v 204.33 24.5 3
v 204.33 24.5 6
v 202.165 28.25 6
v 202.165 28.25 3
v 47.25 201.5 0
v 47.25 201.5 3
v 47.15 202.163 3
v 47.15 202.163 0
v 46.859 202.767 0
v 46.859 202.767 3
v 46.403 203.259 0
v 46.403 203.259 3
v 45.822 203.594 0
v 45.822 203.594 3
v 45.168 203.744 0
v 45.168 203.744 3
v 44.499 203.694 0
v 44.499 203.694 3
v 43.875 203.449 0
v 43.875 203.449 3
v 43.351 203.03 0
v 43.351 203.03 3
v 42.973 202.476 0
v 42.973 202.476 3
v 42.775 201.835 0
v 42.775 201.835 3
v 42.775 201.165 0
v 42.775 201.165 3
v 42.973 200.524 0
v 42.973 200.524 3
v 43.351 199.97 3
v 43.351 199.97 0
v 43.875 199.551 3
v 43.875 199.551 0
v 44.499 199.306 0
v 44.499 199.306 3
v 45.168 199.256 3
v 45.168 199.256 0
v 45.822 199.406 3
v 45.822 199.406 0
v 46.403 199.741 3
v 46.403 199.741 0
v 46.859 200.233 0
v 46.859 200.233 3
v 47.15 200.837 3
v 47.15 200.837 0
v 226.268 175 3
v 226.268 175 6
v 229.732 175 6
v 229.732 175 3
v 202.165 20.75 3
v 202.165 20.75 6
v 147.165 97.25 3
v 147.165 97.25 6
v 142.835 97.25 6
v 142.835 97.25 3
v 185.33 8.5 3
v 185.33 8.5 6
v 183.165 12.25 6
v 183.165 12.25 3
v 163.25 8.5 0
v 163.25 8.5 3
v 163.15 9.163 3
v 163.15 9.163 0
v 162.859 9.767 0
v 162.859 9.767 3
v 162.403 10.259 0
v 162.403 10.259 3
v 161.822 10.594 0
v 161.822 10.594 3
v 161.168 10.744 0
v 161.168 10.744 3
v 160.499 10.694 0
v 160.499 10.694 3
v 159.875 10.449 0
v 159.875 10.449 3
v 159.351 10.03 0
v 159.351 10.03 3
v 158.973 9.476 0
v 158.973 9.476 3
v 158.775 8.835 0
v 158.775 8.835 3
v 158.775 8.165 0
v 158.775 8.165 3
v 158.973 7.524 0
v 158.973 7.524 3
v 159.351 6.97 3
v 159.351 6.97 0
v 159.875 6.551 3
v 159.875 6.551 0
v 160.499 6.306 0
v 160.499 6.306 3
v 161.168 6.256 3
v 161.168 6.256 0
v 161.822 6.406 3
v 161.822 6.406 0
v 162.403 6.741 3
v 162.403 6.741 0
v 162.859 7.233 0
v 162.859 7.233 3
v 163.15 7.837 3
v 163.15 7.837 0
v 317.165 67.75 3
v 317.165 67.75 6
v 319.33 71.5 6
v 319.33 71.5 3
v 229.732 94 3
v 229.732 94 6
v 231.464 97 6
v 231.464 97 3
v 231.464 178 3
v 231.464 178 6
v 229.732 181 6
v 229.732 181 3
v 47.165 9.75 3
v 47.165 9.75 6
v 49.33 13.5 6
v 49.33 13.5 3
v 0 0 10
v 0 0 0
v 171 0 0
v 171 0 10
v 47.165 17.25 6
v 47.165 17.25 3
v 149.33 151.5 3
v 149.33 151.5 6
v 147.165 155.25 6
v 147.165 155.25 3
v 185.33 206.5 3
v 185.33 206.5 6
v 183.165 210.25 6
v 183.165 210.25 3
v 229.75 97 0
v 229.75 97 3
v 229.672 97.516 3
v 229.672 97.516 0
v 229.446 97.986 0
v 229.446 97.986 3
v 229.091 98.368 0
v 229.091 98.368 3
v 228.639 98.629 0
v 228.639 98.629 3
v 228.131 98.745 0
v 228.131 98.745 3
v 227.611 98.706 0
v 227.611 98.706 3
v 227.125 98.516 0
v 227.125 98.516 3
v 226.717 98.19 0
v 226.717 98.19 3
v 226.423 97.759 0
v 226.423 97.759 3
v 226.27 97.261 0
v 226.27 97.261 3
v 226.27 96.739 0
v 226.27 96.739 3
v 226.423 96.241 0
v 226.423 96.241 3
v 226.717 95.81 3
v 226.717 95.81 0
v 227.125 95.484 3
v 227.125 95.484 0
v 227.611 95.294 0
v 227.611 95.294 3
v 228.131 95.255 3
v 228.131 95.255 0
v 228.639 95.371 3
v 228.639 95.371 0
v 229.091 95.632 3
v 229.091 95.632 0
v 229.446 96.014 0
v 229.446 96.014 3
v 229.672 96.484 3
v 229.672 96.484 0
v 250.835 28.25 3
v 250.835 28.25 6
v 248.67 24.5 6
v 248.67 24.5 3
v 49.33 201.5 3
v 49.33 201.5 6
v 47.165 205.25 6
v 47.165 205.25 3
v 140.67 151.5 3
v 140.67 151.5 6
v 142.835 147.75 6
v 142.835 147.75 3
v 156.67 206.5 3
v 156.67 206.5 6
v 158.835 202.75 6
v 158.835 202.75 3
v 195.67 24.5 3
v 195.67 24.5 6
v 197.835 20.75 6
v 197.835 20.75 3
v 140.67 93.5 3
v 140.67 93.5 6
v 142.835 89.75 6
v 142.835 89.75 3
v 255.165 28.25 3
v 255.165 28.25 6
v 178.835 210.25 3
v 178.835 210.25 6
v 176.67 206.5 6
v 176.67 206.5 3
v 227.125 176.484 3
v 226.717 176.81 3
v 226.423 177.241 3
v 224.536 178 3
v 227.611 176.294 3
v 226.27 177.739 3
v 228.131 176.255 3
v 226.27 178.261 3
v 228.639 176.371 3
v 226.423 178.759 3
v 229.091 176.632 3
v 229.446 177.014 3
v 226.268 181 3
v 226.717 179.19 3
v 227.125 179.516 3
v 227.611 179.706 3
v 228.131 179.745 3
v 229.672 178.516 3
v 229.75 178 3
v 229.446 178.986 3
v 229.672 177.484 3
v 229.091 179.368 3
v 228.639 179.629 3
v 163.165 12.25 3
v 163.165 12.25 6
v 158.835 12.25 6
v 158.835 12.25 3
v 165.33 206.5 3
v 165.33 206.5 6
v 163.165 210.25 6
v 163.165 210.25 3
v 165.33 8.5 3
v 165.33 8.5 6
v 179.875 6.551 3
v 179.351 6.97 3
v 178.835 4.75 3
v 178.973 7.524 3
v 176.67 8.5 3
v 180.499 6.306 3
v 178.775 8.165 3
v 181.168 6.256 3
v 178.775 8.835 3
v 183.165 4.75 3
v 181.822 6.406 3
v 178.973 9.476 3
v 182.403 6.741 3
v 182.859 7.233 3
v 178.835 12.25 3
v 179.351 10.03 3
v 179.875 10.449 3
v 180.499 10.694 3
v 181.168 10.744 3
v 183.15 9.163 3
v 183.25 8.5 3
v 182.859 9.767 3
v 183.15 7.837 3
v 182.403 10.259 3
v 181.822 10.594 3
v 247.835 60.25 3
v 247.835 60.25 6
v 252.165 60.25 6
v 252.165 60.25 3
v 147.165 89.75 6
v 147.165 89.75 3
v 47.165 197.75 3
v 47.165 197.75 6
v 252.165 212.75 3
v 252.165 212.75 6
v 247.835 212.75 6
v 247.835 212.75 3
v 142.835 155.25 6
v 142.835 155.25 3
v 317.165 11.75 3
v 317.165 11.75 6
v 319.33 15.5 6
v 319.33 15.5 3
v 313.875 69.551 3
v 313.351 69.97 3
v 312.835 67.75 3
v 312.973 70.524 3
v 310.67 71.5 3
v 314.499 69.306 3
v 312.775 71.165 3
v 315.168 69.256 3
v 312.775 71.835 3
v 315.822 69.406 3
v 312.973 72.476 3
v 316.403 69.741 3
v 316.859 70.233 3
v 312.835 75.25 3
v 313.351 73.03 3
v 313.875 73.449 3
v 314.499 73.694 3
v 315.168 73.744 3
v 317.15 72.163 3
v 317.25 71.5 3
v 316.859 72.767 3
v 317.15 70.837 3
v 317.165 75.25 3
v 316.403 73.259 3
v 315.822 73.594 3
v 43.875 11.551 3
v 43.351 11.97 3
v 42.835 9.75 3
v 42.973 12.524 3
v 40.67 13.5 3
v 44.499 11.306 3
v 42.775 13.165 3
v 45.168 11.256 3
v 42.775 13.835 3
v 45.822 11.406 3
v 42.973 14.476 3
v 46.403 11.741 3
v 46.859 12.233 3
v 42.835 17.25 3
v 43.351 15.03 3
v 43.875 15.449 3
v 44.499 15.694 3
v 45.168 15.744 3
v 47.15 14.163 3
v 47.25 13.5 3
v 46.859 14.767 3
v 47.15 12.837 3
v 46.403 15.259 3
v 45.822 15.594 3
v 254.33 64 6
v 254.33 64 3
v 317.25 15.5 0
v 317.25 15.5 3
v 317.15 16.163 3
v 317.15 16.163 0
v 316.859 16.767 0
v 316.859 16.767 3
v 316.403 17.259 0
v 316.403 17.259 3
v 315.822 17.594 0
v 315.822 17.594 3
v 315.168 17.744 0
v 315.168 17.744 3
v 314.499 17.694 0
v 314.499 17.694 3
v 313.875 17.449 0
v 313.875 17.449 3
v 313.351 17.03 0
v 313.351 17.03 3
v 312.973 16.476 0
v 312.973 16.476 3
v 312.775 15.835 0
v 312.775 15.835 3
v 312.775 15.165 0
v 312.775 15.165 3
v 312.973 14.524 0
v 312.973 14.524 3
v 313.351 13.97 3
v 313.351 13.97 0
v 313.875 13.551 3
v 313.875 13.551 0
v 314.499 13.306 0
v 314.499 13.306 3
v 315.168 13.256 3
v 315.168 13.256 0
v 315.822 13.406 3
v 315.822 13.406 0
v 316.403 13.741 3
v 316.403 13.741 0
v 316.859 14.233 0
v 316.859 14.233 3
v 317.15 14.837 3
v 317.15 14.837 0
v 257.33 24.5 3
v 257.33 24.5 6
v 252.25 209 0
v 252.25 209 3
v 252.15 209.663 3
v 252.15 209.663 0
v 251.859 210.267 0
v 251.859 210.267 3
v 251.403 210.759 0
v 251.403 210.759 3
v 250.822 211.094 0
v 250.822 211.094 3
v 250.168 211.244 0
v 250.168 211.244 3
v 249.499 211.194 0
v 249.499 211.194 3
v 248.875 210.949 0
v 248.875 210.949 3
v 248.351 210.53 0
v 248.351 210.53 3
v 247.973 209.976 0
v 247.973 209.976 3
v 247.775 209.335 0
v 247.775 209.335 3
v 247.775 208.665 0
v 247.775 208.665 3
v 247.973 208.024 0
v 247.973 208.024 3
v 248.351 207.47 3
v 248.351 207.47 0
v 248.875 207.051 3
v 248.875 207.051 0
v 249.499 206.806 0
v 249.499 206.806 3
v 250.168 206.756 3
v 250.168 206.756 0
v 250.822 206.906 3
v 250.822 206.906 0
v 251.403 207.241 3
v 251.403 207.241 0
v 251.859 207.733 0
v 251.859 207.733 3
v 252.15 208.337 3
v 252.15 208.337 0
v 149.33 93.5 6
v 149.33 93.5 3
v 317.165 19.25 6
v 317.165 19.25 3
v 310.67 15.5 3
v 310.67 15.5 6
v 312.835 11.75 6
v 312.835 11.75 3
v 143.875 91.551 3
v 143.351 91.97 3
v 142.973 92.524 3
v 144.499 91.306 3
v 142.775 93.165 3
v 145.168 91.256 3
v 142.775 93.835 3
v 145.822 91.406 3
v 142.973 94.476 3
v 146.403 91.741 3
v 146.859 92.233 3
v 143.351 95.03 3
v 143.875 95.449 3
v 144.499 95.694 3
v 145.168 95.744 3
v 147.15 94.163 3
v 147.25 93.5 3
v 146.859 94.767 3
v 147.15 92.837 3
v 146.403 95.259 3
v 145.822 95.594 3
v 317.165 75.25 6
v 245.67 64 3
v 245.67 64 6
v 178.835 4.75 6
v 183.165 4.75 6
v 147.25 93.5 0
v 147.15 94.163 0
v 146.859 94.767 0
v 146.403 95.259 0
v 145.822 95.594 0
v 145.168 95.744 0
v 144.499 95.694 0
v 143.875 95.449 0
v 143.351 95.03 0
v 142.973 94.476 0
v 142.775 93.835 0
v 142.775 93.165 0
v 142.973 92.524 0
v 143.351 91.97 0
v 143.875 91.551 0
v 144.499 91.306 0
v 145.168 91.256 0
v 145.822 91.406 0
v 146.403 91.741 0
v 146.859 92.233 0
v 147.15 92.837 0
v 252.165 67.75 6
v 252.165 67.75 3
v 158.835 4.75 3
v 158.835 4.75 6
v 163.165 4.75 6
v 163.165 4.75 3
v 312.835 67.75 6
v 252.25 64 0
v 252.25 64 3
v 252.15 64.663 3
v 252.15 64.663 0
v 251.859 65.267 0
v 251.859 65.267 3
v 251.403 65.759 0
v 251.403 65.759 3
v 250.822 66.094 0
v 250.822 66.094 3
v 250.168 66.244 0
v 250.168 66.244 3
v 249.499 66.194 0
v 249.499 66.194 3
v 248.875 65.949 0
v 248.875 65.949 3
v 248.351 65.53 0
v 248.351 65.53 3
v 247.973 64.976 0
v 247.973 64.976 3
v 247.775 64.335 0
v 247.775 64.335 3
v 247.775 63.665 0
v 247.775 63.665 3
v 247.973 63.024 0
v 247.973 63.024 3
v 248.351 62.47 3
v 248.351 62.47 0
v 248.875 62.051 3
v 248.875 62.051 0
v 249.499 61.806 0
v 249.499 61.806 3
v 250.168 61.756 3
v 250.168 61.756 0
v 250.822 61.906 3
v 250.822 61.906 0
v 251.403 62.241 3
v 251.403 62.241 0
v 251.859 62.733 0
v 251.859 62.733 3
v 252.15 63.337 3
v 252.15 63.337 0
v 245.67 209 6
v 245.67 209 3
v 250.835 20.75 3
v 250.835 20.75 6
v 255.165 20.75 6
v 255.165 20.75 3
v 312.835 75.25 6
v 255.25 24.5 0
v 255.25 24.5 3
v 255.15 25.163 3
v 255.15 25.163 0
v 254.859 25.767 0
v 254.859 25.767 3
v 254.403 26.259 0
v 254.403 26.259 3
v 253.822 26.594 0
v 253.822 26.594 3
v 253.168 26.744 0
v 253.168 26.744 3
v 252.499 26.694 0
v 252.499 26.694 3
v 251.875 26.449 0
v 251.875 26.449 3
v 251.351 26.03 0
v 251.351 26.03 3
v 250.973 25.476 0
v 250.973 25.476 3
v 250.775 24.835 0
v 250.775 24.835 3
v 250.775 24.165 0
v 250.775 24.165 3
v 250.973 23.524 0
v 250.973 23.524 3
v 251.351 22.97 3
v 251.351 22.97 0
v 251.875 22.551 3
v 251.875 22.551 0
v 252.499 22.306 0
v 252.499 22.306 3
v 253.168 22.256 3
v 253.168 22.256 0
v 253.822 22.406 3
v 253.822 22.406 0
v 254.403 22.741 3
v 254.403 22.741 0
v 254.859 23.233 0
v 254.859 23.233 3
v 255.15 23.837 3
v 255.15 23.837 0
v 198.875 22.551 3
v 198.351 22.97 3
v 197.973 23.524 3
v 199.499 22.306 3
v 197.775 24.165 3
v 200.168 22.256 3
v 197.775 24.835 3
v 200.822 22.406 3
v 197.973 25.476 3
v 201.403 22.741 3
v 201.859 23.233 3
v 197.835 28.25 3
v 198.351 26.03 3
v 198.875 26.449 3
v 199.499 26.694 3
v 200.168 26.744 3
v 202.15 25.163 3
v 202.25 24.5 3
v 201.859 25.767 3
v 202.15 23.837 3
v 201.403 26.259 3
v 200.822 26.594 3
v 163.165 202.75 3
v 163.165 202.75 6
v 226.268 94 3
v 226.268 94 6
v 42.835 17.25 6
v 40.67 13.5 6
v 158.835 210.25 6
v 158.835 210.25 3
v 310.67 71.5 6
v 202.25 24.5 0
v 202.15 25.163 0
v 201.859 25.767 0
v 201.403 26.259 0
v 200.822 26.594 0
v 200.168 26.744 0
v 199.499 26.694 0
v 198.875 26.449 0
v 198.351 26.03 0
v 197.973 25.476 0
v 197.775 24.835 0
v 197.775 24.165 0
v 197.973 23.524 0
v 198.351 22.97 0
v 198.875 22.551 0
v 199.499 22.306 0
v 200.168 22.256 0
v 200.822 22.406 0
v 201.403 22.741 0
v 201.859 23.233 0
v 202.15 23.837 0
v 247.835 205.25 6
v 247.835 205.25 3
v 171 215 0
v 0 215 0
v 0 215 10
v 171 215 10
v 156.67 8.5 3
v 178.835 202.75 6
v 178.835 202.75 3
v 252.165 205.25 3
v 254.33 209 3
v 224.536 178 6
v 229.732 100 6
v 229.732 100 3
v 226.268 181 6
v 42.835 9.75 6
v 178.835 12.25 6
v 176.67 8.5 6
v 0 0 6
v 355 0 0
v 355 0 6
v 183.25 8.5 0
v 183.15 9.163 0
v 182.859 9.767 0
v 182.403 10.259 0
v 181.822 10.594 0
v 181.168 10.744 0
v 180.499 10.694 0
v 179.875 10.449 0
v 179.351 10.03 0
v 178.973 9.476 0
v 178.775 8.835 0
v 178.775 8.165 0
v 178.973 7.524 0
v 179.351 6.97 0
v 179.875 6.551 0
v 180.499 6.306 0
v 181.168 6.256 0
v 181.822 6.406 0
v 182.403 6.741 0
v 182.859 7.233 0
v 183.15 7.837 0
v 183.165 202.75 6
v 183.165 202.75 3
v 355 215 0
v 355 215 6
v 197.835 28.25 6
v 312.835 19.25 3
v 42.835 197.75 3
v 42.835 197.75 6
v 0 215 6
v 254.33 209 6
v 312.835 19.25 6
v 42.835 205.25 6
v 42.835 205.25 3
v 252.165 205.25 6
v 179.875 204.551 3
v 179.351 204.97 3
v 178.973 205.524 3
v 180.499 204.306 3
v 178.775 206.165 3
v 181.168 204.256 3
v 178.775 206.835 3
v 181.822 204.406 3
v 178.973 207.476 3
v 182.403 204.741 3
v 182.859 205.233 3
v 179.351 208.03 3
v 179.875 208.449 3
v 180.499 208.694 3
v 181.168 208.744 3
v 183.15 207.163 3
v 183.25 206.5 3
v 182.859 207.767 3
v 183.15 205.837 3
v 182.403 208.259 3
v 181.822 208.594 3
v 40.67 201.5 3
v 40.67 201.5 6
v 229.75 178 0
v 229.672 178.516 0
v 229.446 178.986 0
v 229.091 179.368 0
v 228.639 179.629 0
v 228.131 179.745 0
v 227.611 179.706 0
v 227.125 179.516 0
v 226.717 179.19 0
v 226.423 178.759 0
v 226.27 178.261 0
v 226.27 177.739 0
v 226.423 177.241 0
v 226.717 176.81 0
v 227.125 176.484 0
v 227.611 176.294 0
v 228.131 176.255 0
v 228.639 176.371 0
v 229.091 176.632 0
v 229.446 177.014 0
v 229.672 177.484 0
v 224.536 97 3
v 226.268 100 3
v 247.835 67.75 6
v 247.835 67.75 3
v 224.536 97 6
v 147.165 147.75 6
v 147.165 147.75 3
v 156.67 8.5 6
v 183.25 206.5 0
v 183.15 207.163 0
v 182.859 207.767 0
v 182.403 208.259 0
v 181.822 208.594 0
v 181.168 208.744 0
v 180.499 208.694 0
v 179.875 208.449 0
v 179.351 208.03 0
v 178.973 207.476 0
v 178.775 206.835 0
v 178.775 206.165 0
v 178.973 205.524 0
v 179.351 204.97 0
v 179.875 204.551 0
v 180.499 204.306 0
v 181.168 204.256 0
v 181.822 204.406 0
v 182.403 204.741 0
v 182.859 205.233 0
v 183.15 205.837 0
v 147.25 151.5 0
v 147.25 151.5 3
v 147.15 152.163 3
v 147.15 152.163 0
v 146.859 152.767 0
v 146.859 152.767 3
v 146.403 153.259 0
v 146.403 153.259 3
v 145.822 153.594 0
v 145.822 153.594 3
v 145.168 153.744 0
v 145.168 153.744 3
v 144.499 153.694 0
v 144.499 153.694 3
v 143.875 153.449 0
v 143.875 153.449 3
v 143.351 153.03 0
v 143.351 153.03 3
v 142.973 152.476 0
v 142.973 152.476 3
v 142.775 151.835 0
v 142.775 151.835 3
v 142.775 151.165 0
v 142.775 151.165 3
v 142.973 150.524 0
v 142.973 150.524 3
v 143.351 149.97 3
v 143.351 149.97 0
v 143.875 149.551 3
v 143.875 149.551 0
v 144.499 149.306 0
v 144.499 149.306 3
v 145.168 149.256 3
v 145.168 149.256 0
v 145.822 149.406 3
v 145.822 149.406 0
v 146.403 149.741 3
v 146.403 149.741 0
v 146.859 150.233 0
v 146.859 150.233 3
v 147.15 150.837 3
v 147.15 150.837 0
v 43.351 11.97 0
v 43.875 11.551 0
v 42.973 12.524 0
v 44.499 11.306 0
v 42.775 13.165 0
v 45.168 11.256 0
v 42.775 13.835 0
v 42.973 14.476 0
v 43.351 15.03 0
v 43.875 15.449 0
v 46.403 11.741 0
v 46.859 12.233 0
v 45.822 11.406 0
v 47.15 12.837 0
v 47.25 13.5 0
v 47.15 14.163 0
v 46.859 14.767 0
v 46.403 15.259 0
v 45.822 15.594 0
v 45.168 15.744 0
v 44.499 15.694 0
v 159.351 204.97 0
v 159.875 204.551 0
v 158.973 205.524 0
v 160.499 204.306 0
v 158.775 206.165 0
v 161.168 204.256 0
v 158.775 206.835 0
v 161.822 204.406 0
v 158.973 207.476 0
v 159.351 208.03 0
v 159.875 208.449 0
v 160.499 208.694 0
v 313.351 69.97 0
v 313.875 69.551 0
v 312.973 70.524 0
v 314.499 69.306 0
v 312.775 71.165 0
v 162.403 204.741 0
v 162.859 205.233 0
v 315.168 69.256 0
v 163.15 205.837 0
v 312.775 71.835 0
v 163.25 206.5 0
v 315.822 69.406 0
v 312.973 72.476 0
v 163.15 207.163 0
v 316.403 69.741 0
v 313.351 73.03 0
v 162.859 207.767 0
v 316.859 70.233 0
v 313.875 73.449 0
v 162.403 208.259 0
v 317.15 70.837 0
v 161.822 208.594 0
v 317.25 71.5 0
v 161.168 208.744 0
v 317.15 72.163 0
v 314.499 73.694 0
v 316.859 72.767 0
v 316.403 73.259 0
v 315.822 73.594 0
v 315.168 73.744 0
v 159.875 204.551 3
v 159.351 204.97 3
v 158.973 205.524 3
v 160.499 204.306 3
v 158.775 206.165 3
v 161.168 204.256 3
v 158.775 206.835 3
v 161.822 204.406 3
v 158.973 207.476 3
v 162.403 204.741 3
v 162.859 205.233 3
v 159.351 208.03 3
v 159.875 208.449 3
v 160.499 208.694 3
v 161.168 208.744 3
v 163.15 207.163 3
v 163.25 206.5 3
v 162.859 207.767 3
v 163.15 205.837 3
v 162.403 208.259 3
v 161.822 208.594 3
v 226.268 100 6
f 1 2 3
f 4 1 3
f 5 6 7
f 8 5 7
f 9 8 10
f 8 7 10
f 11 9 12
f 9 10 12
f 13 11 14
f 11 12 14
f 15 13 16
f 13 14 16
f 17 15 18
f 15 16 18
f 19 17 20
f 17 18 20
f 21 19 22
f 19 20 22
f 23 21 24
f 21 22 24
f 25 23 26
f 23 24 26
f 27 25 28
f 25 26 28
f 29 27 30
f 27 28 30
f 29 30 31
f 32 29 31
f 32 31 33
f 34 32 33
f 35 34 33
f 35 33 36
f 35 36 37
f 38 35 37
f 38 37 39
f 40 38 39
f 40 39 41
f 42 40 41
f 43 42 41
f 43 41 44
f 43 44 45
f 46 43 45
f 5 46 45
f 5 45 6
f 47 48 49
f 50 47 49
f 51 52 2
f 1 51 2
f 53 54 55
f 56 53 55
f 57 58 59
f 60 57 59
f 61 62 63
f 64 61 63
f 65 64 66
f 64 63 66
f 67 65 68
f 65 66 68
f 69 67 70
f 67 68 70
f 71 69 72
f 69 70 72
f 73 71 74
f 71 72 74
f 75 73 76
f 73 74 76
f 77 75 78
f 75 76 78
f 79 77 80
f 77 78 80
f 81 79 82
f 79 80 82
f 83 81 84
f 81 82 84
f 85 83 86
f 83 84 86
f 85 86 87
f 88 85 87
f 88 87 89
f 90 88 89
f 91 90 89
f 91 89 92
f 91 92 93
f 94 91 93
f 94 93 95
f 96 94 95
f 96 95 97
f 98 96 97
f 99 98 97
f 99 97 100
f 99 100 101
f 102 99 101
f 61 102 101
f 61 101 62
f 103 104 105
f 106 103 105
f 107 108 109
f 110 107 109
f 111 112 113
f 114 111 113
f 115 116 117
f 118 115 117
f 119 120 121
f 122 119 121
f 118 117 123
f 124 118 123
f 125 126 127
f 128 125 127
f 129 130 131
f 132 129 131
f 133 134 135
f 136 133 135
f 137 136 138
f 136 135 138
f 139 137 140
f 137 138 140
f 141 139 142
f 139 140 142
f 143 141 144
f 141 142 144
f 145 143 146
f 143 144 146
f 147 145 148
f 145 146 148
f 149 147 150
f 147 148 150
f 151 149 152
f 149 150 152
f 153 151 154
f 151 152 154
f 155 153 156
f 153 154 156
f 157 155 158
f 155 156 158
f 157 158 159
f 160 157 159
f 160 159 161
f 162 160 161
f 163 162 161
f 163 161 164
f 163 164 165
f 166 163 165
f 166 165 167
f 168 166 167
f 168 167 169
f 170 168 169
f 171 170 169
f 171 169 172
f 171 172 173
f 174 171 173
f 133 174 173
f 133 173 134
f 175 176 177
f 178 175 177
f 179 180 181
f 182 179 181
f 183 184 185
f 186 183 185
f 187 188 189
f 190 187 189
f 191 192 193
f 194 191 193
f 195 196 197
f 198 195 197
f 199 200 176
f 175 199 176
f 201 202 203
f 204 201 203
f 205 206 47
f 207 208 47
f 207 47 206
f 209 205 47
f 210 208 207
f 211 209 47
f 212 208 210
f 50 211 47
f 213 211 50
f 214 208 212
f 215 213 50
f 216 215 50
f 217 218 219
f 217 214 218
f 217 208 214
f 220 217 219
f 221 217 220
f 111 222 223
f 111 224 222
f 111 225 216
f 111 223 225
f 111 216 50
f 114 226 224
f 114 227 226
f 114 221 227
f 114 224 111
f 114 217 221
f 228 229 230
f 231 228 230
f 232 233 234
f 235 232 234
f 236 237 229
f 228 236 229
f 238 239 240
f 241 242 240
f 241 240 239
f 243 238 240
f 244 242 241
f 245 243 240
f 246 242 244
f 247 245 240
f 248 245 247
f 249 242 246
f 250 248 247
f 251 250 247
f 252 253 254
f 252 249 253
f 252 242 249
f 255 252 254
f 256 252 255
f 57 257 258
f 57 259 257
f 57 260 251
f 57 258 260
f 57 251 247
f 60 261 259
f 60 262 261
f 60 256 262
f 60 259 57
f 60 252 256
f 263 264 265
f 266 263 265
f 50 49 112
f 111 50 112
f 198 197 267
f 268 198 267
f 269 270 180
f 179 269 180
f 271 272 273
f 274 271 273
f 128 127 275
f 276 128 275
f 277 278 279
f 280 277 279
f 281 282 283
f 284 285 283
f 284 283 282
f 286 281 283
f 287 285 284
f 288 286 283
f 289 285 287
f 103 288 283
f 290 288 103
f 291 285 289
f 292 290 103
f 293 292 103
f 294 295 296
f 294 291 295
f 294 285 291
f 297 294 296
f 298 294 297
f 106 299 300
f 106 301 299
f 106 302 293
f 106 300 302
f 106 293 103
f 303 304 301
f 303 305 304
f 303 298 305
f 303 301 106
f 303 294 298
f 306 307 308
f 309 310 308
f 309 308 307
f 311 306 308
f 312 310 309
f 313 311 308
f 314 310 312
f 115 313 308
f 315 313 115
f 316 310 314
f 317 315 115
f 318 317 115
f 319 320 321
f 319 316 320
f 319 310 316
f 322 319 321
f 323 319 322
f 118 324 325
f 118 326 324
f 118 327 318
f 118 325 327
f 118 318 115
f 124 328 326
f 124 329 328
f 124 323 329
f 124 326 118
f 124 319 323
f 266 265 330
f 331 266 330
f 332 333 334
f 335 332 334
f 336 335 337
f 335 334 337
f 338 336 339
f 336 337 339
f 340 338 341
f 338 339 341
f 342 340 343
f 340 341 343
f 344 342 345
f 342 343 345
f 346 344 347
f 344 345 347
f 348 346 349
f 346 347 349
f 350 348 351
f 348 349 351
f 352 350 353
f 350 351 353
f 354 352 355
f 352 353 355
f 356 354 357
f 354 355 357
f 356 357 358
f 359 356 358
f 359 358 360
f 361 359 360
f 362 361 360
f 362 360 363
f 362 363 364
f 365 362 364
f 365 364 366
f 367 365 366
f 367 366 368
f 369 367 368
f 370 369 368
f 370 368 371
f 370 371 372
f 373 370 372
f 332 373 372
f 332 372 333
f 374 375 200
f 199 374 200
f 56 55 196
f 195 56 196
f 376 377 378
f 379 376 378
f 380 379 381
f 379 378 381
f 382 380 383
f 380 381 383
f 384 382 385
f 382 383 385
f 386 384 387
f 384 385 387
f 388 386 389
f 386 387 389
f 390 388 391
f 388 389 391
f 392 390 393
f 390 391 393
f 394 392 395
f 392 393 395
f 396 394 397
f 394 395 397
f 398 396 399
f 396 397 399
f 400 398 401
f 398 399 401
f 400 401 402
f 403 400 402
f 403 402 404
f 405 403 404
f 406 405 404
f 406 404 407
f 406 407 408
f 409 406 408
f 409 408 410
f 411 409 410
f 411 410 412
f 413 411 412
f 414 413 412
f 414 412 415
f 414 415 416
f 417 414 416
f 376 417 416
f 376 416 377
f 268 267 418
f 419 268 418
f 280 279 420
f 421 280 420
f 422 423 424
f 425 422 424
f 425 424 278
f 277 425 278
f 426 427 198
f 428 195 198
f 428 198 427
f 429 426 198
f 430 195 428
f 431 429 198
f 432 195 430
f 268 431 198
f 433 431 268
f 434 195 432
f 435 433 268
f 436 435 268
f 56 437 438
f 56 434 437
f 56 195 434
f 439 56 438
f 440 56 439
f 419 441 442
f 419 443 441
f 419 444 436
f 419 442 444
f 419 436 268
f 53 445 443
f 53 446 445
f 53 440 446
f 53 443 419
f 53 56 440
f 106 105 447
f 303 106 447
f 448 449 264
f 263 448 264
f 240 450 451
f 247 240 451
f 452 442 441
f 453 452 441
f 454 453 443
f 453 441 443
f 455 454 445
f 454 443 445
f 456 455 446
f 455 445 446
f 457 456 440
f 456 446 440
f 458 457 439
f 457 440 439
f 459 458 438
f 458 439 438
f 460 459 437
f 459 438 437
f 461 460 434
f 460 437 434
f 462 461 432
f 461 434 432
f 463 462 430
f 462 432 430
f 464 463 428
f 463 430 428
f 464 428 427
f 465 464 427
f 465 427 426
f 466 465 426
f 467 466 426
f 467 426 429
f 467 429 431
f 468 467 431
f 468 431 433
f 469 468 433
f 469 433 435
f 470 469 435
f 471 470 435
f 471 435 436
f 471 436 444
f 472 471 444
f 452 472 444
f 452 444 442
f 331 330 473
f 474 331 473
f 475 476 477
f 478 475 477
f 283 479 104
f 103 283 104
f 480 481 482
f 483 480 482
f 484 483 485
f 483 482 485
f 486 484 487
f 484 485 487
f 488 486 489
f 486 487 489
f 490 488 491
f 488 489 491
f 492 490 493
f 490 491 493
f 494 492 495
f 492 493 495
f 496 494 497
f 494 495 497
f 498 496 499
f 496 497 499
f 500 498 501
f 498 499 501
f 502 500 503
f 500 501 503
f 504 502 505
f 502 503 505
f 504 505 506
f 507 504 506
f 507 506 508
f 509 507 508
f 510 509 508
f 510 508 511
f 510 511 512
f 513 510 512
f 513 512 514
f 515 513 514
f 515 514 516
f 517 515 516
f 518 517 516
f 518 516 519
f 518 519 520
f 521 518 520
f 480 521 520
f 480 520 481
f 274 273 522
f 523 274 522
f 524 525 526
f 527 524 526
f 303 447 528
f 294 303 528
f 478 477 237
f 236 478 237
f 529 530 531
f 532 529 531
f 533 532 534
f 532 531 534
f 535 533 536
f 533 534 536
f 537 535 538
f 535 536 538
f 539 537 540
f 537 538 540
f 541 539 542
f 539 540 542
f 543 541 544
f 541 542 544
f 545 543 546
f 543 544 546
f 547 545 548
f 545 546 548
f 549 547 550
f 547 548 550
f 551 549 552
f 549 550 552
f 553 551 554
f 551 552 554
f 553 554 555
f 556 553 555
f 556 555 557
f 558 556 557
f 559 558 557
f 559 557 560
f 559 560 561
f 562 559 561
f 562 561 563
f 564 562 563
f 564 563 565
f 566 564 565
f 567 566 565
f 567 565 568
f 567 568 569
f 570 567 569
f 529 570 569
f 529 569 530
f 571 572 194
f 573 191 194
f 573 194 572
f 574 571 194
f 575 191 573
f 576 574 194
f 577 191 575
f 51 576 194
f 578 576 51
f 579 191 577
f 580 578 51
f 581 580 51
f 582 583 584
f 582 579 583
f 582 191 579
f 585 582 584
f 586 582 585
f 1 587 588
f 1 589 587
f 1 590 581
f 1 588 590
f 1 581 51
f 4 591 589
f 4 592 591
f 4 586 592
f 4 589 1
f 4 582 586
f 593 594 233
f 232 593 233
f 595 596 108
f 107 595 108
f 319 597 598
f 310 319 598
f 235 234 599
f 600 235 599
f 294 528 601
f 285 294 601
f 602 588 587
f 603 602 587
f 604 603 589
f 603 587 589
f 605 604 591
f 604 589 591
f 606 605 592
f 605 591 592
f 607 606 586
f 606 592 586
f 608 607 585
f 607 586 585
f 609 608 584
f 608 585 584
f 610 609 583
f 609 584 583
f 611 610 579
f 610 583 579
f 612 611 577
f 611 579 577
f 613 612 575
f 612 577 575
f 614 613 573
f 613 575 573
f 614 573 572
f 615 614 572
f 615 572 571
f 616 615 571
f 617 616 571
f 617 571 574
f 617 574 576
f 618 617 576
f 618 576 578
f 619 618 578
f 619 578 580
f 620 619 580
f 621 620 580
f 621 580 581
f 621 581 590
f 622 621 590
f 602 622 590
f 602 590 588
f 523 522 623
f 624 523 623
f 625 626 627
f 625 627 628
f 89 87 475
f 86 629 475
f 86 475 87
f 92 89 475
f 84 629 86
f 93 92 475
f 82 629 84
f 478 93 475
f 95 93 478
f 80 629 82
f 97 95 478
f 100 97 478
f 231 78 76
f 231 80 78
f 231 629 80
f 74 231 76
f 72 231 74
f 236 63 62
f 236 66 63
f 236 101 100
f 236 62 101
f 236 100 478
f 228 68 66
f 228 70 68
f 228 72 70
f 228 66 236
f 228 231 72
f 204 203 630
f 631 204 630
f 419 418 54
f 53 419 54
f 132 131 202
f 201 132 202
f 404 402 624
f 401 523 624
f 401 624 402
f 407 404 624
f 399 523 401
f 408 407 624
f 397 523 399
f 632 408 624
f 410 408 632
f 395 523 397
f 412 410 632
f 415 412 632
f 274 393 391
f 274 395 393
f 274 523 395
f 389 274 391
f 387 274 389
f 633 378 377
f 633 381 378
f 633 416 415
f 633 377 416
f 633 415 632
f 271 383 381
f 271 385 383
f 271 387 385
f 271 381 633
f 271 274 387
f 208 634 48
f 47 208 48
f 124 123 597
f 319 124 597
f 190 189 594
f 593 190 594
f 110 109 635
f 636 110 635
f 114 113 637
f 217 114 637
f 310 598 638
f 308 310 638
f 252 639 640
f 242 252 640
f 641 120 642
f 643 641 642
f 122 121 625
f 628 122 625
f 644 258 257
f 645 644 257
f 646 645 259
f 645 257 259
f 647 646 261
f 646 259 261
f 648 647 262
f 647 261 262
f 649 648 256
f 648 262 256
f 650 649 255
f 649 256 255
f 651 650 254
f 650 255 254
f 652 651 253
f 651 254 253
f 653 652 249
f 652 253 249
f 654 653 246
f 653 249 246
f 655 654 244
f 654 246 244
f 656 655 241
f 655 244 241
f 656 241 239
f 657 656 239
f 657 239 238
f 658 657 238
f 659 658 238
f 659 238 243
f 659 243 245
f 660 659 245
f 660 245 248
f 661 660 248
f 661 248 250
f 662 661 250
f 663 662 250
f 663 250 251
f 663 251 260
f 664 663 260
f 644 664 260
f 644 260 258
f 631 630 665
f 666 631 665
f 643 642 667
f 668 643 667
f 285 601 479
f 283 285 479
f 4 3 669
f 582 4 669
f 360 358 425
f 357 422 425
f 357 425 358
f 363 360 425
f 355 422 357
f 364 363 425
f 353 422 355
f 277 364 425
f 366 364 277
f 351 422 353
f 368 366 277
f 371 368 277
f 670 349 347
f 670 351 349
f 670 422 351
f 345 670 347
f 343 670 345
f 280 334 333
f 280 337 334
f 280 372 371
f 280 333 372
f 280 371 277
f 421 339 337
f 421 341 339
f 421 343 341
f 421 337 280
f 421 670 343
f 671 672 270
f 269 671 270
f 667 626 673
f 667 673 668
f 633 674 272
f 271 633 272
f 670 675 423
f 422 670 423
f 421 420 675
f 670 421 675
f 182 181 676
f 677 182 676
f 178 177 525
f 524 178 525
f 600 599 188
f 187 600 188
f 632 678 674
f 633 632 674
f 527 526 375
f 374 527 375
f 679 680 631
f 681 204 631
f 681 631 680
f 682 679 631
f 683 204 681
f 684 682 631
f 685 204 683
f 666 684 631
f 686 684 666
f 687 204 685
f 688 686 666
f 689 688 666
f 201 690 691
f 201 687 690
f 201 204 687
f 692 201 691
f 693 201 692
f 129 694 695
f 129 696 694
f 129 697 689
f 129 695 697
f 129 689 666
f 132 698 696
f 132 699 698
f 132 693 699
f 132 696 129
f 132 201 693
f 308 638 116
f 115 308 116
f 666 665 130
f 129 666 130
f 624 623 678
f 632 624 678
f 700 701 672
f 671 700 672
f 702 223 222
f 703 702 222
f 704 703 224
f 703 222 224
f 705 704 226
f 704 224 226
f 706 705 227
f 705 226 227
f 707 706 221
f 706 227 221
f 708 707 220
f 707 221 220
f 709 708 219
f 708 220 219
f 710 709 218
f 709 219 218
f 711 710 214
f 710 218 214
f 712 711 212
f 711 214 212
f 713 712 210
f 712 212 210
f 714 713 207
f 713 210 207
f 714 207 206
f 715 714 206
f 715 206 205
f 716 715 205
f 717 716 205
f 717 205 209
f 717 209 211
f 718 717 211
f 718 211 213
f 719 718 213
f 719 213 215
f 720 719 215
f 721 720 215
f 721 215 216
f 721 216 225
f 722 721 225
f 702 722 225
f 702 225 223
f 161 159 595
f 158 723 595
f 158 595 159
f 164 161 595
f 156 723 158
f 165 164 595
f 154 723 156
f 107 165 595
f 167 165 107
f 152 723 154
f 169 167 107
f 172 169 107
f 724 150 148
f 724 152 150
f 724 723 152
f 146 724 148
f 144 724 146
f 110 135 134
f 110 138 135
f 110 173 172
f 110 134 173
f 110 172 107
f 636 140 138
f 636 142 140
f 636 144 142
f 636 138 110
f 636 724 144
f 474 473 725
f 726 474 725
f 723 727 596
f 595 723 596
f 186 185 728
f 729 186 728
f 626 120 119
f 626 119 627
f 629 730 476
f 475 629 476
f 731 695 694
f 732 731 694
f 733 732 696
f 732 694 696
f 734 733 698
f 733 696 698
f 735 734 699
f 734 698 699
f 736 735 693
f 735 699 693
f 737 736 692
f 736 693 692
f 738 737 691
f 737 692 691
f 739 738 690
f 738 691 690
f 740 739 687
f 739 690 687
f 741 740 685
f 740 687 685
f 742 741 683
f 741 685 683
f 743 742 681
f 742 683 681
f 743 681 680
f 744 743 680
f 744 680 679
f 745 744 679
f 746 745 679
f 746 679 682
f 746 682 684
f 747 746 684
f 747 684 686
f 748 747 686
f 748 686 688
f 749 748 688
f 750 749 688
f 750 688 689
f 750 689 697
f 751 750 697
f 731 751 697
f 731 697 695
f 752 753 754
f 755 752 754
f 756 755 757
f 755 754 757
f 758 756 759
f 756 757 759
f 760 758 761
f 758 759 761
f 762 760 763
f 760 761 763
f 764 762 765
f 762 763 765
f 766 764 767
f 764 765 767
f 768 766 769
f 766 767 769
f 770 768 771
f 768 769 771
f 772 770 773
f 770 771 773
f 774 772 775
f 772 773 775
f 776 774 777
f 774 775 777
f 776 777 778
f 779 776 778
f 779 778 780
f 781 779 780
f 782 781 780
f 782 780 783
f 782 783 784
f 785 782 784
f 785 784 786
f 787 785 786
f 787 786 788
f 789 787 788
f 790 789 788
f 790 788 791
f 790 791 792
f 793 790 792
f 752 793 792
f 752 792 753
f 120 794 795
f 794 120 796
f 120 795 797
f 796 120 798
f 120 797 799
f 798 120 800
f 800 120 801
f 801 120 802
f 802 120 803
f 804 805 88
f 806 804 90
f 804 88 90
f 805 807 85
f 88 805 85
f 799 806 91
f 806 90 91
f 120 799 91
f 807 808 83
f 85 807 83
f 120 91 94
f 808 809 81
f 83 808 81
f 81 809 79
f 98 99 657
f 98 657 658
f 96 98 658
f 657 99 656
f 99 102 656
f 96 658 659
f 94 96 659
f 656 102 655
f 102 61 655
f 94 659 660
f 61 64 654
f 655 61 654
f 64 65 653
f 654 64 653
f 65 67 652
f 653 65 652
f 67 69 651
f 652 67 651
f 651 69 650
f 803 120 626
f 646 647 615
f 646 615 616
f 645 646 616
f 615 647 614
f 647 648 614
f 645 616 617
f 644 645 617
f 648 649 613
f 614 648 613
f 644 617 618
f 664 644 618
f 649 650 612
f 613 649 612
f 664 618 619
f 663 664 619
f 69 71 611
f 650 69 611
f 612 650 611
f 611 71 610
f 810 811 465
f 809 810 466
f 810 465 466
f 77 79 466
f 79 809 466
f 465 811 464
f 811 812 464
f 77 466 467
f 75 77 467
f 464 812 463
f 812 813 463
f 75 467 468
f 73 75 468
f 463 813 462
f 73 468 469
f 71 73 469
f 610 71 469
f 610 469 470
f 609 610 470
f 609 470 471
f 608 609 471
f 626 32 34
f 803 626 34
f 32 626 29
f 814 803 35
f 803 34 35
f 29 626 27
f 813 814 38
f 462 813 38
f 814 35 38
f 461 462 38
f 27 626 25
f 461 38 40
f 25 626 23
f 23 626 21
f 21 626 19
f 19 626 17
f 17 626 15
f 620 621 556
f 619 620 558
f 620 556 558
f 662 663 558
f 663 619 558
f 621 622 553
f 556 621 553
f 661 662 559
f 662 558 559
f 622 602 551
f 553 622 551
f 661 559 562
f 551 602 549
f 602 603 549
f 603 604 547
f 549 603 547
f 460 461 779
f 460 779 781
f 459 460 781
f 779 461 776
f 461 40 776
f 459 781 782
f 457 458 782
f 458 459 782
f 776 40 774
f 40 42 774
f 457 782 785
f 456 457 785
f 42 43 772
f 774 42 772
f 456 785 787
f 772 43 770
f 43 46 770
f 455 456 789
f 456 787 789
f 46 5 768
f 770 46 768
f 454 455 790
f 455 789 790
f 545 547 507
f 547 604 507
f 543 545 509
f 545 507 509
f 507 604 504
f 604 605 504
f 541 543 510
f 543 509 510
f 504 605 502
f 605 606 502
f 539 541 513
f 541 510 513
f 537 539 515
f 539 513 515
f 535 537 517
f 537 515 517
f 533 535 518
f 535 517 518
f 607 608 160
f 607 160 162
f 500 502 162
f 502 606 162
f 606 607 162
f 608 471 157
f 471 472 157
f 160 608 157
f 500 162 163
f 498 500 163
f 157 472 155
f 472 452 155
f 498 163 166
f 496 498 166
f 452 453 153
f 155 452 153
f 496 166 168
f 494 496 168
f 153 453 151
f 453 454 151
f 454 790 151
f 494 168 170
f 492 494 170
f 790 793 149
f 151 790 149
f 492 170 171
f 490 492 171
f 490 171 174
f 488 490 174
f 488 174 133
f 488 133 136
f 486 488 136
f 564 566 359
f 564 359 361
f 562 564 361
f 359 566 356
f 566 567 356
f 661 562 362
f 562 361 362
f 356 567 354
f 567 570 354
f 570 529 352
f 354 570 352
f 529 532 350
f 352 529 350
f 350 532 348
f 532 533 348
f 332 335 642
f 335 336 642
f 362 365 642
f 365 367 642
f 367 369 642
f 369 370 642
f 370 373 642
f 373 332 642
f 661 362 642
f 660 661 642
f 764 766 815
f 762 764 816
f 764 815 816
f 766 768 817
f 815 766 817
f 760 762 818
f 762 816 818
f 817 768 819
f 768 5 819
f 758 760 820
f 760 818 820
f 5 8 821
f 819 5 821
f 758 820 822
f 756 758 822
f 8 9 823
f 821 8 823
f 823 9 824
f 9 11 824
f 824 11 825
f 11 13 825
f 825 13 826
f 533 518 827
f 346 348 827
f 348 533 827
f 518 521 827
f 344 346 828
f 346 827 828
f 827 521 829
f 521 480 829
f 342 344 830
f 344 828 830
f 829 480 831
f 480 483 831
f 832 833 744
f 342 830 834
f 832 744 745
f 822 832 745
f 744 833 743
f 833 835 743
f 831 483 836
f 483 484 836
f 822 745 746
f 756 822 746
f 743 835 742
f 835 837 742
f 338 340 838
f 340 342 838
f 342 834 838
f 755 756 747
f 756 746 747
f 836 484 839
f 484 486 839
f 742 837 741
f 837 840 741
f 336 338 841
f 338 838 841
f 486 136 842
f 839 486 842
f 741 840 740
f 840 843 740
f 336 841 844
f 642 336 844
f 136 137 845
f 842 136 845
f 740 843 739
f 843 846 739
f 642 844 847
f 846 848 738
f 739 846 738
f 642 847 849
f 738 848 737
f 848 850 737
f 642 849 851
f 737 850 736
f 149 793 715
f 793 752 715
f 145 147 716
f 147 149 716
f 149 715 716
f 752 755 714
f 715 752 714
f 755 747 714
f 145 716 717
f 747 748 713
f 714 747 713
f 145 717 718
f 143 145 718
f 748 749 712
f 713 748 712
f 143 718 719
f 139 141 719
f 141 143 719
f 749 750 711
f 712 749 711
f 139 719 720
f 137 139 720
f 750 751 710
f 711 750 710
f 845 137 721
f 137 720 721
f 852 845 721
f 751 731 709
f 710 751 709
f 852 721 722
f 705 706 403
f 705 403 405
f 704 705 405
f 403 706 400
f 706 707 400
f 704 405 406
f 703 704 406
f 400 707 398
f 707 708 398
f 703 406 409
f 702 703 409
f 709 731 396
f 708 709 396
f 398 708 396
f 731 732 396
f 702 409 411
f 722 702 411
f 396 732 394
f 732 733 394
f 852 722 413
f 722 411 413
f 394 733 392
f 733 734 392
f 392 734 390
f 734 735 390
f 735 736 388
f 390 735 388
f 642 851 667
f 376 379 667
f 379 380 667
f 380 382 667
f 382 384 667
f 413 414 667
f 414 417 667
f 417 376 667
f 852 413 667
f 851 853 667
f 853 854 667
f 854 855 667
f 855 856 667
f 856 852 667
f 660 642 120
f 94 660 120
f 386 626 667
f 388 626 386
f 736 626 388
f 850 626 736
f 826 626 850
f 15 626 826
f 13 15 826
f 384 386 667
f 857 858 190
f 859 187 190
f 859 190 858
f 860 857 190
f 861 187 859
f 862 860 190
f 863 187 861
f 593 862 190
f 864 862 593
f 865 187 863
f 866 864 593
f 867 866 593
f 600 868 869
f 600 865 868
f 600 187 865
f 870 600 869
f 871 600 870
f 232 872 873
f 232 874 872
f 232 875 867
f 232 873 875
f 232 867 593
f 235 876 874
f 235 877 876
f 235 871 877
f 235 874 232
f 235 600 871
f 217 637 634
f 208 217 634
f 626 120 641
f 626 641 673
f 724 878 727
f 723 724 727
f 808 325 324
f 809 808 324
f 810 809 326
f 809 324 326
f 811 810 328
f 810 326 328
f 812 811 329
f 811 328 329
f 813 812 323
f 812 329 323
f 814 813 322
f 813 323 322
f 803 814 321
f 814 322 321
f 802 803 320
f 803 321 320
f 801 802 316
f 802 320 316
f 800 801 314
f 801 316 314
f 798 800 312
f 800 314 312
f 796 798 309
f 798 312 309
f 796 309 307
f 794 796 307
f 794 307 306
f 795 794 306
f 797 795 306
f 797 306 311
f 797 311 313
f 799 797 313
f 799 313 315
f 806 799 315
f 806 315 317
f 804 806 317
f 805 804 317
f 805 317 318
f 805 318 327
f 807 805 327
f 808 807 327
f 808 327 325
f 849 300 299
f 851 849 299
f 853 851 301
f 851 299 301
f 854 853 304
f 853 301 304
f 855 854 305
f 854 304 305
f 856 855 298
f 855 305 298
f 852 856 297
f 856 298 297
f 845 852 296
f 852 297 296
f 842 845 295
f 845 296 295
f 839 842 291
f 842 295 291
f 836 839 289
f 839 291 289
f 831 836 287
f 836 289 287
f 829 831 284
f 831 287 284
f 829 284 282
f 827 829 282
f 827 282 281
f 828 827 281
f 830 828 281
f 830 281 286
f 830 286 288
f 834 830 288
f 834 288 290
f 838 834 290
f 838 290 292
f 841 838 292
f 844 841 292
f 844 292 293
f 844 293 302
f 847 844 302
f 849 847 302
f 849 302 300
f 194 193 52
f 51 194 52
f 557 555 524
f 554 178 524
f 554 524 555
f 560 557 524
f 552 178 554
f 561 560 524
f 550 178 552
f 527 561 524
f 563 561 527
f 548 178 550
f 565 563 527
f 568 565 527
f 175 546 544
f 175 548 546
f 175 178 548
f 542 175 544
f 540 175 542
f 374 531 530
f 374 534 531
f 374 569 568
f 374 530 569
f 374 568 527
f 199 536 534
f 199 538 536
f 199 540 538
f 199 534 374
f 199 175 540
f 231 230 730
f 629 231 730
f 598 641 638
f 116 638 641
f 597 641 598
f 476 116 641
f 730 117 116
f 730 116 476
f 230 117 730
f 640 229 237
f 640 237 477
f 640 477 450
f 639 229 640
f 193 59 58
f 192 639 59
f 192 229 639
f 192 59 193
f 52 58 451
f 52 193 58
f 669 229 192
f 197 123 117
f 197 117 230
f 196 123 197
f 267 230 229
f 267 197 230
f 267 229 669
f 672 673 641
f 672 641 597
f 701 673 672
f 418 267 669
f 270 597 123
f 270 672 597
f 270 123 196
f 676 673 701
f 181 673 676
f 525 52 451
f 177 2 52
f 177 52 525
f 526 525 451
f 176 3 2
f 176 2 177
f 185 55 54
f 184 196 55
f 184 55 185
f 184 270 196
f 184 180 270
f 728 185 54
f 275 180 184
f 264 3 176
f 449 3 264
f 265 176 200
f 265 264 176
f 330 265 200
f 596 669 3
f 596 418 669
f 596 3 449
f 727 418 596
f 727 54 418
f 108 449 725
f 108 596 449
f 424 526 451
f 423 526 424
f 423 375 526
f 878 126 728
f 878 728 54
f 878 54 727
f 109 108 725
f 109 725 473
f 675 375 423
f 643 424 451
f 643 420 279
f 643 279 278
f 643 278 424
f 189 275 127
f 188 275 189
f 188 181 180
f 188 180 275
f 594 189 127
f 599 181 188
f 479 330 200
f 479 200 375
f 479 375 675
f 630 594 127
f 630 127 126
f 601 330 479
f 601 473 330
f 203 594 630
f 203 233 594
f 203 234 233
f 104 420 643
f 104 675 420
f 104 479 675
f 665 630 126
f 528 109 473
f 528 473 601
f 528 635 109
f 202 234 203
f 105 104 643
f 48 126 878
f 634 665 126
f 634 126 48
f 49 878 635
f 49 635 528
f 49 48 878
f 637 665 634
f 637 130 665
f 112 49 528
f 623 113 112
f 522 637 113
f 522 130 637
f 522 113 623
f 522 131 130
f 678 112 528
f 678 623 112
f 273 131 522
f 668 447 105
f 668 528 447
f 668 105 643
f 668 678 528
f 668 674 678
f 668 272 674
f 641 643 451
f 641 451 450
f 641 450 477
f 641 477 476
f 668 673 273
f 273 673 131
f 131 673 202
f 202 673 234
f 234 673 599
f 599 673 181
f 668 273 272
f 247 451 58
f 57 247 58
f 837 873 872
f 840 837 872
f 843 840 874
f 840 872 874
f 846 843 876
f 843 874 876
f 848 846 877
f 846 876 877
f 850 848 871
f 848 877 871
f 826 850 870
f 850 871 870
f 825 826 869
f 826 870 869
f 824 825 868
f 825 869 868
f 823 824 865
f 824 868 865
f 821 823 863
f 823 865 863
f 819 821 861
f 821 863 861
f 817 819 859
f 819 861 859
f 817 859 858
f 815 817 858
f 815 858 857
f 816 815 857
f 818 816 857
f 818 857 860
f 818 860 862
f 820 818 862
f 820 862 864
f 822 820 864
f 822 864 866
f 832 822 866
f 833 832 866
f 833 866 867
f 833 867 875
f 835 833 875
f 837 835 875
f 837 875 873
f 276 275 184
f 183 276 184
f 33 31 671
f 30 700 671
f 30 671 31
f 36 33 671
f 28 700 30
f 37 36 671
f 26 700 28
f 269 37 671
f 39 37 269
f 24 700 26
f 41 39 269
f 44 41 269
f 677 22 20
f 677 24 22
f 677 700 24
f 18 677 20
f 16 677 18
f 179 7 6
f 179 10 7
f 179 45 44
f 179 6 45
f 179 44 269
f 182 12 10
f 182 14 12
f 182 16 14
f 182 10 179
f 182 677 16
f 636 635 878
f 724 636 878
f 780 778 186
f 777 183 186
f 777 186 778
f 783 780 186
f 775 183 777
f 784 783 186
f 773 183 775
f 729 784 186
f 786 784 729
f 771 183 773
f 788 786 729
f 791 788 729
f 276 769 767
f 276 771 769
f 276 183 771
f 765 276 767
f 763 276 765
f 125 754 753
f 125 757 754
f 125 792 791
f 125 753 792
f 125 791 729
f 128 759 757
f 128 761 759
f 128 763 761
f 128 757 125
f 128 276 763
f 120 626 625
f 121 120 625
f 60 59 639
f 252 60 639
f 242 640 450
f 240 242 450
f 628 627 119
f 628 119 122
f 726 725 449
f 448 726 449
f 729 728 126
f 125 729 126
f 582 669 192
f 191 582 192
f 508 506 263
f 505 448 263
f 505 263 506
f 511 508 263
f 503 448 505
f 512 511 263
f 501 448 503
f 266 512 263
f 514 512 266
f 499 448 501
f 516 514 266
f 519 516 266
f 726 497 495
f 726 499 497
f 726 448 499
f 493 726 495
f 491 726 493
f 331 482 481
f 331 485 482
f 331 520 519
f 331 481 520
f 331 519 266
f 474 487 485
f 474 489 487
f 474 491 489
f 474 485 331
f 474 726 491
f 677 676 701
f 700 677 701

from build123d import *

# Parameters (mm, degrees)
SKETCH_W        = 355
SKETCH_H        = 215
PAD_DEPTH       = 6
SKETCH001_R     = 2.25
SKETCH001_R_2   = 1.75
POCKET_DEPTH    = 10
POCKET001_DEPTH = 3
BOX_W           = 171
BOX_H           = 215
BOX_DEPTH       = 10


with BuildPart() as body:
    # Sketch → Pad (new body)
    with BuildSketch(Plane.XY):
        with Locations((177.5, 107.5)):
            Rectangle(SKETCH_W, SKETCH_H)
    extrude(amount=PAD_DEPTH)

    # Sketch001 (on Face6 of Pad) → Pocket (cut)
    with BuildSketch(Plane.XY.offset(6)):
        with Locations((45, 13.5)):
            Circle(SKETCH001_R)
        with Locations((45, 201.5)):
            Circle(SKETCH001_R)
        with Locations((145, 93.5)):
            Circle(SKETCH001_R)
        with Locations((145, 151.5)):
            Circle(SKETCH001_R)
        with Locations((200, 24.5)):
            Circle(SKETCH001_R)
        with Locations((253, 24.5)):
            Circle(SKETCH001_R)
        with Locations((250, 209)):
            Circle(SKETCH001_R)
        with Locations((250, 64)):
            Circle(SKETCH001_R)
        with Locations((315, 15.5)):
            Circle(SKETCH001_R)
        with Locations((315, 71.5)):
            Circle(SKETCH001_R)
        with Locations((228, 97)):
            Circle(SKETCH001_R_2)
        with Locations((228, 178)):
            Circle(SKETCH001_R_2)
        with Locations((161, 8.5)):
            Circle(SKETCH001_R)
        with Locations((181, 8.5)):
            Circle(SKETCH001_R)
        with Locations((161, 206.5)):
            Circle(SKETCH001_R)
        with Locations((181, 206.5)):
            Circle(SKETCH001_R)
    extrude(amount=-POCKET_DEPTH, mode=Mode.SUBTRACT)

    # Sketch002 (on Face5 of Pocket) → Pocket001 (cut)
    with BuildSketch(Plane.XY.offset(6)):
        Polygon((47.165064, 17.25), (42.834936, 17.25), (40.669873, 13.5), (42.834936, 9.75), (47.165064, 9.75), (49.330127, 13.5), align=None)
        Polygon((47.165064, 197.75), (49.330127, 201.5), (47.165064, 205.25), (42.834936, 205.25), (40.669873, 201.5), (42.834936, 197.75), align=None)
        Polygon((147.165064, 97.25), (142.834936, 97.25), (140.669873, 93.5), (142.834936, 89.75), (147.165064, 89.75), (149.330127, 93.5), align=None)
        Polygon((149.330127, 151.5), (147.165064, 155.25), (142.834936, 155.25), (140.669873, 151.5), (142.834936, 147.75), (147.165064, 147.75), align=None)
        Polygon((163.165064, 12.25), (158.834936, 12.25), (156.669873, 8.5), (158.834936, 4.75), (163.165064, 4.75), (165.330127, 8.5), align=None)
        Polygon((183.165064, 12.25), (178.834936, 12.25), (176.669873, 8.5), (178.834936, 4.75), (183.165064, 4.75), (185.330127, 8.5), align=None)
        Polygon((163.165064, 202.75), (165.330127, 206.5), (163.165064, 210.25), (158.834936, 210.25), (156.669873, 206.5), (158.834936, 202.75), align=None)
        Polygon((183.165064, 202.75), (185.330127, 206.5), (183.165064, 210.25), (178.834936, 210.25), (176.669873, 206.5), (178.834936, 202.75), align=None)
        Polygon((202.165064, 28.25), (197.834936, 28.25), (195.669873, 24.5), (197.834936, 20.75), (202.165064, 20.75), (204.330127, 24.5), align=None)
        Polygon((255.165064, 28.25), (250.834936, 28.25), (248.669873, 24.5), (250.834936, 20.75), (255.165064, 20.75), (257.330127, 24.5), align=None)
        Polygon((252.165064, 60.25), (254.330127, 64), (252.165064, 67.75), (247.834936, 67.75), (245.669873, 64), (247.834936, 60.25), align=None)
        Polygon((252.165064, 205.25), (254.330127, 209), (252.165064, 212.75), (247.834936, 212.75), (245.669873, 209), (247.834936, 205.25), align=None)
        Polygon((317.165064, 19.25), (312.834936, 19.25), (310.669873, 15.5), (312.834936, 11.75), (317.165064, 11.75), (319.330127, 15.5), align=None)
        Polygon((319.330127, 71.5), (317.165064, 75.25), (312.834936, 75.25), (310.669873, 71.5), (312.834936, 67.75), (317.165064, 67.75), align=None)
        Polygon((231.464102, 97), (229.732051, 100), (226.267949, 100), (224.535898, 97), (226.267949, 94), (229.732051, 94), align=None)
        Polygon((229.732051, 181), (226.267949, 181), (224.535898, 178), (226.267949, 175), (229.732051, 175), (231.464102, 178), align=None)
    extrude(amount=-POCKET001_DEPTH, mode=Mode.SUBTRACT)


with BuildPart() as cube:
    # Box → Box (new body)
    with BuildSketch(Plane.XY):
        with Locations((85.5, 107.5)):
            Rectangle(BOX_W, BOX_H)
    extrude(amount=BOX_DEPTH)


solid = Compound([body.part, cube.part])
